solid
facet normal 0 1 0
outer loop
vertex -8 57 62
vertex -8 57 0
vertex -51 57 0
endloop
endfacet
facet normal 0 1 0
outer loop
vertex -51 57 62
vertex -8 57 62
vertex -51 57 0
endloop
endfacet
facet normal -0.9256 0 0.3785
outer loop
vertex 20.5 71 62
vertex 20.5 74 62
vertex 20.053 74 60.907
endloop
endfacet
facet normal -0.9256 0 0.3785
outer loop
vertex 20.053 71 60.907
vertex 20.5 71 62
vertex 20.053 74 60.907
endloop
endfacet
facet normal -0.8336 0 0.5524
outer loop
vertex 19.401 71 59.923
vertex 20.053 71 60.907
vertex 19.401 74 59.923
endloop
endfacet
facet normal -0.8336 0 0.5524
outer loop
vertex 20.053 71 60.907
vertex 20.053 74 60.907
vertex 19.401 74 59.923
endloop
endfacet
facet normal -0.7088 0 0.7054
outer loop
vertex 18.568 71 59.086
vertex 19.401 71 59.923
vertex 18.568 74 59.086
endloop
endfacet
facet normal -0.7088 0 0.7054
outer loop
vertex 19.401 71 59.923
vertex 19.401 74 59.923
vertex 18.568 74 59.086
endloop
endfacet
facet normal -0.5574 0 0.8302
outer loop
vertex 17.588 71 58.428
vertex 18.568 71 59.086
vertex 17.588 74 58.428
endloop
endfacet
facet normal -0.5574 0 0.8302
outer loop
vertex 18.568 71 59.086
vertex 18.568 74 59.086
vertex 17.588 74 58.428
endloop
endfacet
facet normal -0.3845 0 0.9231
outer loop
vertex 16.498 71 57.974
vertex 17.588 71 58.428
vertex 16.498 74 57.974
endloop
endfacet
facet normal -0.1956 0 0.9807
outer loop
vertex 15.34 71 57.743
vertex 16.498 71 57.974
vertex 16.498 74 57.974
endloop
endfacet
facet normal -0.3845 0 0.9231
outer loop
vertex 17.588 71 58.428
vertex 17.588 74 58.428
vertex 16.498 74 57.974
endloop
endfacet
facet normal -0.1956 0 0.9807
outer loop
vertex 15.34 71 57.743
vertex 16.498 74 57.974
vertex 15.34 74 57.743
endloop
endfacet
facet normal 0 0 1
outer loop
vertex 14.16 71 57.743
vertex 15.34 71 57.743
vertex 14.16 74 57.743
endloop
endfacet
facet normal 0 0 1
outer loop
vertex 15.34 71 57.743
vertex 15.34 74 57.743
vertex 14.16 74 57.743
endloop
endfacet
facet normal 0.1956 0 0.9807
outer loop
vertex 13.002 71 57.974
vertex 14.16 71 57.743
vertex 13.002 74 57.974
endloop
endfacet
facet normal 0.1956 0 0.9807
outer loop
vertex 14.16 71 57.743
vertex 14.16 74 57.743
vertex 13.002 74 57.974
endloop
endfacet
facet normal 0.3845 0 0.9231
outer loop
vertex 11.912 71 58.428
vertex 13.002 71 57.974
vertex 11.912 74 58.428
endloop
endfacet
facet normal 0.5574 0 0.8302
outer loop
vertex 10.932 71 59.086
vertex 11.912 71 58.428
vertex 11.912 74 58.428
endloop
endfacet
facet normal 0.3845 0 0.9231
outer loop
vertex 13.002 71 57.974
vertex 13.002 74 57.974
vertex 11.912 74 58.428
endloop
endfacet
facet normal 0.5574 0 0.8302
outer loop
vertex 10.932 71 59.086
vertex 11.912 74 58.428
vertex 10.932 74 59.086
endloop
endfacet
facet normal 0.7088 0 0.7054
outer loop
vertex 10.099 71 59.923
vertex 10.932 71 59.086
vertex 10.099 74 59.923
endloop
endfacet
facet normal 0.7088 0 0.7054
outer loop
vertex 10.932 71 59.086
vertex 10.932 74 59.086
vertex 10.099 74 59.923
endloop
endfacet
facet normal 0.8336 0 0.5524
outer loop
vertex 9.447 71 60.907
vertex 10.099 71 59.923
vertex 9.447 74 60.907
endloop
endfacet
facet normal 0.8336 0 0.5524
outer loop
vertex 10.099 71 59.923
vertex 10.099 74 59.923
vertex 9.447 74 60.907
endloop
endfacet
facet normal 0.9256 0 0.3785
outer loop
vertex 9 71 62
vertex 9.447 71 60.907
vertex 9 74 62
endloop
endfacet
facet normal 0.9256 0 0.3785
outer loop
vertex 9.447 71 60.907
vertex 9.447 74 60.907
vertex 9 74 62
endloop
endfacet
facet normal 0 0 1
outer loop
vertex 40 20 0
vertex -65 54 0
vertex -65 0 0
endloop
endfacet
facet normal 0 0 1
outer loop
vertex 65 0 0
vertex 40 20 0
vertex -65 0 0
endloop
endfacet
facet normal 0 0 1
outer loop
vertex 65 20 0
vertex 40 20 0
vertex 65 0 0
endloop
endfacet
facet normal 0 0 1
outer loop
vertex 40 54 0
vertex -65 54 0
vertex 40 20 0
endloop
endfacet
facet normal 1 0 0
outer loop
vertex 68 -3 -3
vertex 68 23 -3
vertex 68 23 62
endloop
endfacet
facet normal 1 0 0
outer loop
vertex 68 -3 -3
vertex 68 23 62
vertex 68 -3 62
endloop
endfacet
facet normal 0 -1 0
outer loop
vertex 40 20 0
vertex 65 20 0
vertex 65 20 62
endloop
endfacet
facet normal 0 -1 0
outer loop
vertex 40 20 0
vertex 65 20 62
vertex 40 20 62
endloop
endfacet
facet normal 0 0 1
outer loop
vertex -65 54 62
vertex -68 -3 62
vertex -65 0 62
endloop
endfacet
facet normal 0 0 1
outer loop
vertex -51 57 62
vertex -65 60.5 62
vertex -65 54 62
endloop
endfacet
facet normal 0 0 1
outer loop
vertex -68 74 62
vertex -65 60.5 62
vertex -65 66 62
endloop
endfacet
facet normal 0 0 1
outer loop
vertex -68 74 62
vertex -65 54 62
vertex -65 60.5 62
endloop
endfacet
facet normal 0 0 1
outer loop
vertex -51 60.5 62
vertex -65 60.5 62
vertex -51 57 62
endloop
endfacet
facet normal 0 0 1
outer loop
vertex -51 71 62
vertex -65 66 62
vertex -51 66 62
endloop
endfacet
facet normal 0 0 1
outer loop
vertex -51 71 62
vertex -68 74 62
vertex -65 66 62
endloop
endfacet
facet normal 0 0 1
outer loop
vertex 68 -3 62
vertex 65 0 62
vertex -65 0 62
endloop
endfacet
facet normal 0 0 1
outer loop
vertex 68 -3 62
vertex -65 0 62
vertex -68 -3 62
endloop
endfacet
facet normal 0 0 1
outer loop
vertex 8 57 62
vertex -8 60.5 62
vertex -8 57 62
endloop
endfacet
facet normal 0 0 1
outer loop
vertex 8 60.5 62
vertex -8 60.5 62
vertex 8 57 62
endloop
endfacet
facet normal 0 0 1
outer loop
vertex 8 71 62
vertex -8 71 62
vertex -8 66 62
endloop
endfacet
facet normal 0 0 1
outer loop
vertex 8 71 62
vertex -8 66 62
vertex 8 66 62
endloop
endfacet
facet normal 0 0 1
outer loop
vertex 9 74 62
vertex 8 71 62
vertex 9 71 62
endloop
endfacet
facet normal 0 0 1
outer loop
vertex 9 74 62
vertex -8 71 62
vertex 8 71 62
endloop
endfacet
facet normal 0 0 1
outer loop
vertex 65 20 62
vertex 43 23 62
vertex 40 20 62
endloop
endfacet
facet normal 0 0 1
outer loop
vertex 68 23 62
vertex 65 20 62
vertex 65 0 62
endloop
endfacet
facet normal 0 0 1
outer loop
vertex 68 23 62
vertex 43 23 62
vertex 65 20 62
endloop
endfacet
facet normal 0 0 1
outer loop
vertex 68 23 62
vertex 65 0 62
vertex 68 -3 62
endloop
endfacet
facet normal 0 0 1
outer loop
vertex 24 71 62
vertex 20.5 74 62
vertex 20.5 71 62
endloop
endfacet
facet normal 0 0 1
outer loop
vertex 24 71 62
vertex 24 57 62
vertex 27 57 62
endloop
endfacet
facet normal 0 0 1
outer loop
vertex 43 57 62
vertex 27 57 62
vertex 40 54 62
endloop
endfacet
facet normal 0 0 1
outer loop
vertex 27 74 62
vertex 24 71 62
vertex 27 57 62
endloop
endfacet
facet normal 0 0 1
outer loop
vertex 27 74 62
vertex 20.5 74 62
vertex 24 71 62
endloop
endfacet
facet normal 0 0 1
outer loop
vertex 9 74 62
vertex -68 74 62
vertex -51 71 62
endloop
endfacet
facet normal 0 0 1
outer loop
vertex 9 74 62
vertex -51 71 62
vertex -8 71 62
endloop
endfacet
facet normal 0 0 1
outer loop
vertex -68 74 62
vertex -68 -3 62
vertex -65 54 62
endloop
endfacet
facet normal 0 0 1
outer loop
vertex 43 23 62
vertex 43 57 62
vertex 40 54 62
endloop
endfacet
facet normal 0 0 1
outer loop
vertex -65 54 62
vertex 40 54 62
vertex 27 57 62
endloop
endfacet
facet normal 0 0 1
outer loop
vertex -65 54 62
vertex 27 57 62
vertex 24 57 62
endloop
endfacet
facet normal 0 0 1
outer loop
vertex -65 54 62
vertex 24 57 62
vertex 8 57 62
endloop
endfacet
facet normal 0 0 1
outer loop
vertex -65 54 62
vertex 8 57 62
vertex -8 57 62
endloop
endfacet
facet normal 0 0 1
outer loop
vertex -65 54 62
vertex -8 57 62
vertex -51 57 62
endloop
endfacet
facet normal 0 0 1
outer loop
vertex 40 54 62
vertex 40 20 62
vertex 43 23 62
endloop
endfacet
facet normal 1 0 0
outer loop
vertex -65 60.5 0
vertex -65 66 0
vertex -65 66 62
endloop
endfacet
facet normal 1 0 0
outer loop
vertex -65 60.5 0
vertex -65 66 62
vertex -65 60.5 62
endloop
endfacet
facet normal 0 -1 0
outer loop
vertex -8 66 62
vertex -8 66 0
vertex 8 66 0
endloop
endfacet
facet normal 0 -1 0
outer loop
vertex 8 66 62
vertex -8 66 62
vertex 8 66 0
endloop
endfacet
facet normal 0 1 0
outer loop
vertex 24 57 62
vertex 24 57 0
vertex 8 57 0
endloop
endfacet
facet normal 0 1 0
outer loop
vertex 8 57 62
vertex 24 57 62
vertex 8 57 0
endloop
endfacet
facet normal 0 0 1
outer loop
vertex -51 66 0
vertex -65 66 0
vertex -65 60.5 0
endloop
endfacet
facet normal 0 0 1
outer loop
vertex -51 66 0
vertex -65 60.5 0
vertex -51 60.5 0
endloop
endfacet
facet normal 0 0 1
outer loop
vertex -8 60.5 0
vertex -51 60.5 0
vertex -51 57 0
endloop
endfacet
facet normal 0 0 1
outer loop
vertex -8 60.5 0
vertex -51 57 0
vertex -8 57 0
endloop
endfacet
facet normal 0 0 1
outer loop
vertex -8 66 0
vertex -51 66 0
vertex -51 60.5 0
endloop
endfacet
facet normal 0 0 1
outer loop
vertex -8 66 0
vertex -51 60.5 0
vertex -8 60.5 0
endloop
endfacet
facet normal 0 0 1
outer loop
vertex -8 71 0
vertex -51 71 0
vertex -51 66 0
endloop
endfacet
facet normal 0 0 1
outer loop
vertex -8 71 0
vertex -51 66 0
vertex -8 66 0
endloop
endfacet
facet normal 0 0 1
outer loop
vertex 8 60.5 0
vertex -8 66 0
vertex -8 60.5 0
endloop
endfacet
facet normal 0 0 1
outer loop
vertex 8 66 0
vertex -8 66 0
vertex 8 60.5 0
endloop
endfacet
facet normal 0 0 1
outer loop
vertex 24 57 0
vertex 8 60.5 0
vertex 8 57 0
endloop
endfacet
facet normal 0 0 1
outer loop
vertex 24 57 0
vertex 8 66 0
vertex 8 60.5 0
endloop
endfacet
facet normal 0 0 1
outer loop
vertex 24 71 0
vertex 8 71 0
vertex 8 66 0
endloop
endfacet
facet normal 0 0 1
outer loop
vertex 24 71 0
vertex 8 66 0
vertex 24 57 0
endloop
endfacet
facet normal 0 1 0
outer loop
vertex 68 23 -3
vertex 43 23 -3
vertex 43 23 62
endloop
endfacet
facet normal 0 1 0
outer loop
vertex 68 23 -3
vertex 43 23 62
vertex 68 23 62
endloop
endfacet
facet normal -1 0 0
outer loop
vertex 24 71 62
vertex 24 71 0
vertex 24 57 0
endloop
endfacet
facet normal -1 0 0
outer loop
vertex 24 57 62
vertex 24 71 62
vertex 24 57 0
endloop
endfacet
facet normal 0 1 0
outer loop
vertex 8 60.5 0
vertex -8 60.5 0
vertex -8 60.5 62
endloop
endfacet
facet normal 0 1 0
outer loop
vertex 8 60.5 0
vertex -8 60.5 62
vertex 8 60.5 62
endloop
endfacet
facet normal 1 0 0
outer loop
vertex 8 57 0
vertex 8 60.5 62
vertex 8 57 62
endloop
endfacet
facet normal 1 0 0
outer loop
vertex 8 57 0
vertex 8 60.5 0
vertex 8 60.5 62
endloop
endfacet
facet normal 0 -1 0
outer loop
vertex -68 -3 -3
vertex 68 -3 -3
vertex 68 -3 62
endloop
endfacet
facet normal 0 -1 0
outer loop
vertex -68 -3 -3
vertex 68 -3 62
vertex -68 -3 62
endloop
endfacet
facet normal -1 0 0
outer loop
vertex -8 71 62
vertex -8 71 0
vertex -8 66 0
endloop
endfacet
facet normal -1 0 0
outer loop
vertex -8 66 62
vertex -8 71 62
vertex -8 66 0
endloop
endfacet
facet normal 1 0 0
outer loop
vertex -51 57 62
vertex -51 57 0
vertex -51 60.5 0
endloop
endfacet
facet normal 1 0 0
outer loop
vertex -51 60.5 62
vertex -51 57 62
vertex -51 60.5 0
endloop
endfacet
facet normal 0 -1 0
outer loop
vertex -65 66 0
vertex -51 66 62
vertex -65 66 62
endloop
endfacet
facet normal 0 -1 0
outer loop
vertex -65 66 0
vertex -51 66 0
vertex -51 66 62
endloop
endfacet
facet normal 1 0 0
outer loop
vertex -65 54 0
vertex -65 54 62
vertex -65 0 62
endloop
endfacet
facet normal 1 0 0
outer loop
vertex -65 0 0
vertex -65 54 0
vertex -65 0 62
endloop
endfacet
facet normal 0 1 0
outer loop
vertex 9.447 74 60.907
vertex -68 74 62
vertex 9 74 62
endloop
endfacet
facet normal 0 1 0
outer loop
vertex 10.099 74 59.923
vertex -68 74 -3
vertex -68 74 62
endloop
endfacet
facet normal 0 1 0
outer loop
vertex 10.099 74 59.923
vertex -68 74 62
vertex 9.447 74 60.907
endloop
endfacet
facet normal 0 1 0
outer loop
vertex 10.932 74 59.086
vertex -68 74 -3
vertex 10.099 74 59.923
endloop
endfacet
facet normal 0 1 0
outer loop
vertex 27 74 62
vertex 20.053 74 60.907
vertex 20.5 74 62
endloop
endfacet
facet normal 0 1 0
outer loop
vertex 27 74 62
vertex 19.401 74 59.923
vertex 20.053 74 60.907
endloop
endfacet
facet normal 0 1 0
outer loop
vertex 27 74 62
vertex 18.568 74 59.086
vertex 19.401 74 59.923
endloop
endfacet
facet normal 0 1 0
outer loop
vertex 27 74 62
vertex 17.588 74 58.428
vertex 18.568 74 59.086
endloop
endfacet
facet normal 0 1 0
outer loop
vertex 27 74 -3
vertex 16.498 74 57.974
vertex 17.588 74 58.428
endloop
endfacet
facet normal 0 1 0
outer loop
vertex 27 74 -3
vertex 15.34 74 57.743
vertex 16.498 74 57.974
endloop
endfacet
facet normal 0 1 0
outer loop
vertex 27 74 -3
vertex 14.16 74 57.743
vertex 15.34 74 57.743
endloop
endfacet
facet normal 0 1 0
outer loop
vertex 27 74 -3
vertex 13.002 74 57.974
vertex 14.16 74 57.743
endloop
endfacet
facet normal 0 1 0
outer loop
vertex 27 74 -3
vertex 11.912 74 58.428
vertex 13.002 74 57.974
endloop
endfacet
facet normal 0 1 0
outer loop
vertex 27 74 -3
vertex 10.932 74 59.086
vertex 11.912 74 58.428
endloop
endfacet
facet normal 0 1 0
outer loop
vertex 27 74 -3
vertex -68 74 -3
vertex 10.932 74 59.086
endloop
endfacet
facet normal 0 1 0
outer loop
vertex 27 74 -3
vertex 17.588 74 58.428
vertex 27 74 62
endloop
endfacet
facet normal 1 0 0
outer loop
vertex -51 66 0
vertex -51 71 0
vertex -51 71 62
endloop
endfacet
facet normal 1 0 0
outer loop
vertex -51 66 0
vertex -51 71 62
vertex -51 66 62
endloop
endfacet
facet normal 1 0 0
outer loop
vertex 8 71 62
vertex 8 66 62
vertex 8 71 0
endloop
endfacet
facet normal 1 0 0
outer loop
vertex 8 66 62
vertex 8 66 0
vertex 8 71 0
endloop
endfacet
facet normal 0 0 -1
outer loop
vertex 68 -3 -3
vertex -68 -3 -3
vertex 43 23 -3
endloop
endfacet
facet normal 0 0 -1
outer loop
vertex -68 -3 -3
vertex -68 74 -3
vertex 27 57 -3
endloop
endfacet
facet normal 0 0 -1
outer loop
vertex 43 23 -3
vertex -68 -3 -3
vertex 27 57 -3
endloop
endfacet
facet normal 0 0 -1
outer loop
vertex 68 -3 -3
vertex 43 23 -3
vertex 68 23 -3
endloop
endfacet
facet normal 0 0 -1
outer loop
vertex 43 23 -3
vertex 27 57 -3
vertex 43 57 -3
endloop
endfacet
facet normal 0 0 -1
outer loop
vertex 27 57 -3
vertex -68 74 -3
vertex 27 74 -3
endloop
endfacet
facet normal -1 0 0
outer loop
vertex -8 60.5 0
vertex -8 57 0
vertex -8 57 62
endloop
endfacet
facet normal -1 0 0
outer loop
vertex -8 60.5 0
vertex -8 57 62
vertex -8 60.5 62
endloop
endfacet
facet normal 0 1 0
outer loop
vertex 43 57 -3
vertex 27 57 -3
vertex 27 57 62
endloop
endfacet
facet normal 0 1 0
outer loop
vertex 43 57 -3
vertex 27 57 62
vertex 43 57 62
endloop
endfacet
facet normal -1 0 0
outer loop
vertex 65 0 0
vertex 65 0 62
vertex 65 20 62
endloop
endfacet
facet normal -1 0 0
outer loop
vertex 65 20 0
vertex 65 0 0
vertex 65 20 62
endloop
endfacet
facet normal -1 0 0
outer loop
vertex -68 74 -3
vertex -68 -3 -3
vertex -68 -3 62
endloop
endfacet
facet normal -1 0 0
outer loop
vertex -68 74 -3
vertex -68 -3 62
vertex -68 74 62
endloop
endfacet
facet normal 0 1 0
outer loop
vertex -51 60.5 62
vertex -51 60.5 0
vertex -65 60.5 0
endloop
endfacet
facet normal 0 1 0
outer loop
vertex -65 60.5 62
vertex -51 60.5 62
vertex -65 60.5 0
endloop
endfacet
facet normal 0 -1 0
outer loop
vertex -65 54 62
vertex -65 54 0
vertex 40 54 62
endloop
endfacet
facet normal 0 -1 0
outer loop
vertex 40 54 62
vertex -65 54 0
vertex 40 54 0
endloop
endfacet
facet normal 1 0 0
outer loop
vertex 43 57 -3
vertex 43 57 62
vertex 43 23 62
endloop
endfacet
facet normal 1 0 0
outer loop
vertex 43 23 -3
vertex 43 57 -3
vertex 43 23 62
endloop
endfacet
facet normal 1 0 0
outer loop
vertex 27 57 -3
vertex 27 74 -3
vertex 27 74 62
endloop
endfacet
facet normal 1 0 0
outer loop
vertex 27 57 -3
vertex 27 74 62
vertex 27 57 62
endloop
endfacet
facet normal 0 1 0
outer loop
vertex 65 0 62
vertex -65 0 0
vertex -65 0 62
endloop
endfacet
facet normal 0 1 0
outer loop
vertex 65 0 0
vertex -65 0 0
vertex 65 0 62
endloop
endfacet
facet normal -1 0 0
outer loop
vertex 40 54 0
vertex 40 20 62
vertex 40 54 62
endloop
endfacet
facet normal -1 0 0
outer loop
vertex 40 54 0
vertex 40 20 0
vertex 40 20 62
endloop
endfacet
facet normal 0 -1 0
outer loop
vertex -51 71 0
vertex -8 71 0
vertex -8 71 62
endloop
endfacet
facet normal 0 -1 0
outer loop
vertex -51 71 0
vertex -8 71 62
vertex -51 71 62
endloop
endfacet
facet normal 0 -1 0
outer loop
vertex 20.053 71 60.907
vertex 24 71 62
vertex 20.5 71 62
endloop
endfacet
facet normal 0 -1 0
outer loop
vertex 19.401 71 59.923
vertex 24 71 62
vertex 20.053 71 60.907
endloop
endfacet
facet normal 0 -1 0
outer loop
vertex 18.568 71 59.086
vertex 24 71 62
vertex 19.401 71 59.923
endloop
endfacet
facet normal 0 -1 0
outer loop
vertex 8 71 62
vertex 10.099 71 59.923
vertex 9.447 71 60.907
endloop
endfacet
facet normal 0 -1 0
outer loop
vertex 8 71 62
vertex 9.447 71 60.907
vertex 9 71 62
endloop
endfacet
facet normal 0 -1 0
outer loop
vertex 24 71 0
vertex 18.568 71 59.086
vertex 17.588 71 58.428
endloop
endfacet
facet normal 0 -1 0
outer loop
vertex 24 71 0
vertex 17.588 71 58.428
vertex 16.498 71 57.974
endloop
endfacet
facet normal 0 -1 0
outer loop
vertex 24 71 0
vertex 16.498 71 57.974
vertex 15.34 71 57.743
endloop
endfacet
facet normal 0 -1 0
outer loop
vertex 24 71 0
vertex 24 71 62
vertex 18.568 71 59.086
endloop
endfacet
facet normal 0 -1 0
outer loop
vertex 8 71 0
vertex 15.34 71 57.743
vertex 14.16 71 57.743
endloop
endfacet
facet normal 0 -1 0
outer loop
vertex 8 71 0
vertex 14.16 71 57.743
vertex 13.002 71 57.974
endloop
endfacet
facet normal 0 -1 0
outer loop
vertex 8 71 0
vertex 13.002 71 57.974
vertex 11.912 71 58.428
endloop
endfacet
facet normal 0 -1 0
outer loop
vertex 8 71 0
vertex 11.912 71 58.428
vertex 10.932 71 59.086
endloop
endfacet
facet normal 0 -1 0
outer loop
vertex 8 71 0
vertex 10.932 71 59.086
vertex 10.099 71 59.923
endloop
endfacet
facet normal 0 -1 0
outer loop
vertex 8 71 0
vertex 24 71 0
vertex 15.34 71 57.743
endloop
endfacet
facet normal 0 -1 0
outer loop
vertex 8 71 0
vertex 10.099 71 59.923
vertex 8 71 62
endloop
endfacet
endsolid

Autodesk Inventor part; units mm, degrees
ref_plane "YZ Plane" through (0, 0, 0) normal (1, 0, 0) x (0, 1, 0)
ref_plane "XZ Plane" through (0, 0, 0) normal (0, 1, 0) x (-1, 0, 0)
ref_plane "XY Plane" through (0, 0, 0) normal (0, 0, 1) x (1, 0, 0)
sketch "Skizze1" plane through (0, 0, 0) normal (0, 0, 1) x (1, 0, 0)
  line L0 (-65, 0) -> (65, 0)
  line L1 (65, 0) -> (65, 20)
  line L2 (65, 20) -> (40, 20)
  line L3 (40, 20) -> (40, 54)
  line L4 (-65, 41) -> (-65, 0)
  line L5 (-65, 41) -> (-65, 41)
  line L6 (-65, 54) -> (-65, 54)
  line L7 (-65, 54) -> (-65, 41)
  line L8 (24, 71) -> (24, 54)
  line L9 (24, 54) -> (40, 54)
  line L10 (-65, 54) -> (24, 54)
  line L11 (24, 54) -> (24, 57)
  line L12 (24, 57) -> (-65, 57)
  line L13 (-65, 57) -> (-65, 54)
  line L14 (24, 71) -> (-65, 71)
  line L15 (-65, 71) -> (-65, 54)
  line L16 (43, 23) -> (68, 23)
  line L17 (68, 23) -> (68, -3)
  line L18 (68, -3) -> (-68, -3)
  line L19 (-68, -3) -> (-68, 44)
  line L20 (-68, 44) -> (-68, 44)
  line L21 (-68, 44) -> (-68, 57)
  line L22 (-68, 57) -> (-68, 57)
  line L23 (-68, 57) -> (-68, 74)
  line L24 (-68, 74) -> (27, 74)
  line L25 (27, 74) -> (27, 57)
  line L26 (27, 57) -> (43, 57)
  line L27 (43, 57) -> (43, 23)
  line L28 (-65, 71) -> (-51, 71)
  line L29 (-51, 71) -> (-51, 66)
  line L30 (-51, 66) -> (-65, 66)
  line L31 (-65, 66) -> (-65, 71)
  line L32 (8, 71) -> (-8, 71)
  line L33 (-8, 71) -> (-8, 66)
  line L34 (-8, 66) -> (8, 66)
  line L35 (8, 66) -> (8, 71)
  line L36 (-65, 71) -> (-55, 71)
  line L37 (-55, 71) -> (-55, 66)
  line L38 (-55, 66) -> (-65, 66)
  line L39 (-65, 66) -> (-65, 71)
  line L40 (1, 71) -> (-4, 71)
  line L41 (-4, 71) -> (-4, 66)
  line L42 (-4, 66) -> (1, 66)
  line L43 (1, 66) -> (1, 71)
  line L44 (8, 71) -> (1, 71)
  line L45 (1, 71) -> (1, 66)
  line L46 (1, 66) -> (8, 66)
  line L47 (8, 66) -> (8, 71)
  line L48 (-4, 71) -> (-8, 71)
  line L49 (-8, 71) -> (-8, 66)
  line L50 (-8, 66) -> (-4, 66)
  line L51 (-4, 66) -> (-4, 71)
  line L52 (8, 57) -> (-8, 57)
  line L53 (-8, 57) -> (-8, 60.5)
  line L54 (-8, 60.5) -> (8, 60.5)
  line L55 (8, 60.5) -> (8, 57)
  line L56 (1, 60.5) -> (-4, 60.5)
  line L57 (-4, 60.5) -> (-4, 57)
  line L58 (-4, 57) -> (1, 57)
  line L59 (1, 57) -> (1, 60.5)
  line L60 (-65, 57) -> (-51, 57)
  line L61 (-51, 57) -> (-51, 60.5)
  line L62 (-51, 60.5) -> (-65, 60.5)
  line L63 (-65, 60.5) -> (-65, 57)
  line L64 (-55, 60.5) -> (-65, 60.5)
  line L65 (-65, 60.5) -> (-65, 57)
  line L66 (-65, 57) -> (-55, 57)
  line L67 (-55, 57) -> (-55, 60.5)
  line L68 (-65, 57) -> (24, 57)
  line L69 (24, 57) -> (24, 54)
  line L70 (24, 54) -> (-65, 54)
  line L71 (-65, 54) -> (-65, 57)
  point P0 (0, 0)
  point P1 (0, 0)
  point P2 (0, 0)
  point P3 (0, 0)
  dimension "d0" = 130
  dimension "d1" = 25
  dimension "d2" = 20
  dimension "d3" = 41
  dimension "d4" = 54
  dimension "d16" = 0
  dimension "d17" = 89
  dimension "d18" = 71
  dimension "d19" = 3
  dimension "d21" = 16
  dimension "d22" = 14
  dimension "d23" = 5
  dimension "d24" = 43
  dimension "d25" = 10
  dimension "d26" = 51
  dimension "d27" = 5
  dimension "d28" = 5.5
  dimension "d31" = 3
  dimension "d41" = 0
extrude "Extrusion1" add sketch "Skizze1" against normal blind 3 contours L4 L7 L10 L9 L3 L2 L1 L0 | L13 L12 L8 L10 | L15 L62 L67 L12 | L12 L55 L54 L53 L61 L62 L15 L30 L29 L14 L33 L34 L35 L8 | L67 L62 L61 L12 | L12 L59 L54 L55 | L15 L14 L37 L30 | L35 L34 L43 L14 | L12 L57 L54 L59 | L53 L54 L57 L12 | L37 L14 L29 L30 | L43 L34 L41 L14 | L41 L34 L33 L14 | L16 L17 L18 L19 L21 L23 L24 L25 L26 L27
extrude "Extrusion2" add sketch "Skizze1" along normal blind 62 contours L13 L12 L8 L10 | L15 L62 L67 L12 | L67 L62 L61 L12 | L12 L59 L54 L55 | L15 L14 L37 L30 | L35 L34 L43 L14 | L12 L57 L54 L59 | L53 L54 L57 L12 | L37 L14 L29 L30 | L43 L34 L41 L14 | L41 L34 L33 L14 | L16 L17 L18 L19 L21 L23 L24 L25 L26 L27
sketch "Skizze2" plane through (-68, 74, -3) normal (0, 1, 0) x (1, 0, 0)
  line L0 (95, -65) -> (95, 0) projected
  line L1 (95, -65) -> (0, -65) projected
  line L2 (92, -65) -> (76, -65) projected
  arc A0 (88.5, -65) -> (77, -65) centre (82.75, -66.7139) ccw
  line L3 (77, -65) -> (88.5, -65)
  point P0 (68, -3)
  dimension "d36" = 6
  dimension "d37" = 12.25
  dimension "d38" = 11.5
extrude "Extrusion3" cut sketch "Skizze2" against normal up to surface (3 mm away)
properties part number "Erweiterung"
